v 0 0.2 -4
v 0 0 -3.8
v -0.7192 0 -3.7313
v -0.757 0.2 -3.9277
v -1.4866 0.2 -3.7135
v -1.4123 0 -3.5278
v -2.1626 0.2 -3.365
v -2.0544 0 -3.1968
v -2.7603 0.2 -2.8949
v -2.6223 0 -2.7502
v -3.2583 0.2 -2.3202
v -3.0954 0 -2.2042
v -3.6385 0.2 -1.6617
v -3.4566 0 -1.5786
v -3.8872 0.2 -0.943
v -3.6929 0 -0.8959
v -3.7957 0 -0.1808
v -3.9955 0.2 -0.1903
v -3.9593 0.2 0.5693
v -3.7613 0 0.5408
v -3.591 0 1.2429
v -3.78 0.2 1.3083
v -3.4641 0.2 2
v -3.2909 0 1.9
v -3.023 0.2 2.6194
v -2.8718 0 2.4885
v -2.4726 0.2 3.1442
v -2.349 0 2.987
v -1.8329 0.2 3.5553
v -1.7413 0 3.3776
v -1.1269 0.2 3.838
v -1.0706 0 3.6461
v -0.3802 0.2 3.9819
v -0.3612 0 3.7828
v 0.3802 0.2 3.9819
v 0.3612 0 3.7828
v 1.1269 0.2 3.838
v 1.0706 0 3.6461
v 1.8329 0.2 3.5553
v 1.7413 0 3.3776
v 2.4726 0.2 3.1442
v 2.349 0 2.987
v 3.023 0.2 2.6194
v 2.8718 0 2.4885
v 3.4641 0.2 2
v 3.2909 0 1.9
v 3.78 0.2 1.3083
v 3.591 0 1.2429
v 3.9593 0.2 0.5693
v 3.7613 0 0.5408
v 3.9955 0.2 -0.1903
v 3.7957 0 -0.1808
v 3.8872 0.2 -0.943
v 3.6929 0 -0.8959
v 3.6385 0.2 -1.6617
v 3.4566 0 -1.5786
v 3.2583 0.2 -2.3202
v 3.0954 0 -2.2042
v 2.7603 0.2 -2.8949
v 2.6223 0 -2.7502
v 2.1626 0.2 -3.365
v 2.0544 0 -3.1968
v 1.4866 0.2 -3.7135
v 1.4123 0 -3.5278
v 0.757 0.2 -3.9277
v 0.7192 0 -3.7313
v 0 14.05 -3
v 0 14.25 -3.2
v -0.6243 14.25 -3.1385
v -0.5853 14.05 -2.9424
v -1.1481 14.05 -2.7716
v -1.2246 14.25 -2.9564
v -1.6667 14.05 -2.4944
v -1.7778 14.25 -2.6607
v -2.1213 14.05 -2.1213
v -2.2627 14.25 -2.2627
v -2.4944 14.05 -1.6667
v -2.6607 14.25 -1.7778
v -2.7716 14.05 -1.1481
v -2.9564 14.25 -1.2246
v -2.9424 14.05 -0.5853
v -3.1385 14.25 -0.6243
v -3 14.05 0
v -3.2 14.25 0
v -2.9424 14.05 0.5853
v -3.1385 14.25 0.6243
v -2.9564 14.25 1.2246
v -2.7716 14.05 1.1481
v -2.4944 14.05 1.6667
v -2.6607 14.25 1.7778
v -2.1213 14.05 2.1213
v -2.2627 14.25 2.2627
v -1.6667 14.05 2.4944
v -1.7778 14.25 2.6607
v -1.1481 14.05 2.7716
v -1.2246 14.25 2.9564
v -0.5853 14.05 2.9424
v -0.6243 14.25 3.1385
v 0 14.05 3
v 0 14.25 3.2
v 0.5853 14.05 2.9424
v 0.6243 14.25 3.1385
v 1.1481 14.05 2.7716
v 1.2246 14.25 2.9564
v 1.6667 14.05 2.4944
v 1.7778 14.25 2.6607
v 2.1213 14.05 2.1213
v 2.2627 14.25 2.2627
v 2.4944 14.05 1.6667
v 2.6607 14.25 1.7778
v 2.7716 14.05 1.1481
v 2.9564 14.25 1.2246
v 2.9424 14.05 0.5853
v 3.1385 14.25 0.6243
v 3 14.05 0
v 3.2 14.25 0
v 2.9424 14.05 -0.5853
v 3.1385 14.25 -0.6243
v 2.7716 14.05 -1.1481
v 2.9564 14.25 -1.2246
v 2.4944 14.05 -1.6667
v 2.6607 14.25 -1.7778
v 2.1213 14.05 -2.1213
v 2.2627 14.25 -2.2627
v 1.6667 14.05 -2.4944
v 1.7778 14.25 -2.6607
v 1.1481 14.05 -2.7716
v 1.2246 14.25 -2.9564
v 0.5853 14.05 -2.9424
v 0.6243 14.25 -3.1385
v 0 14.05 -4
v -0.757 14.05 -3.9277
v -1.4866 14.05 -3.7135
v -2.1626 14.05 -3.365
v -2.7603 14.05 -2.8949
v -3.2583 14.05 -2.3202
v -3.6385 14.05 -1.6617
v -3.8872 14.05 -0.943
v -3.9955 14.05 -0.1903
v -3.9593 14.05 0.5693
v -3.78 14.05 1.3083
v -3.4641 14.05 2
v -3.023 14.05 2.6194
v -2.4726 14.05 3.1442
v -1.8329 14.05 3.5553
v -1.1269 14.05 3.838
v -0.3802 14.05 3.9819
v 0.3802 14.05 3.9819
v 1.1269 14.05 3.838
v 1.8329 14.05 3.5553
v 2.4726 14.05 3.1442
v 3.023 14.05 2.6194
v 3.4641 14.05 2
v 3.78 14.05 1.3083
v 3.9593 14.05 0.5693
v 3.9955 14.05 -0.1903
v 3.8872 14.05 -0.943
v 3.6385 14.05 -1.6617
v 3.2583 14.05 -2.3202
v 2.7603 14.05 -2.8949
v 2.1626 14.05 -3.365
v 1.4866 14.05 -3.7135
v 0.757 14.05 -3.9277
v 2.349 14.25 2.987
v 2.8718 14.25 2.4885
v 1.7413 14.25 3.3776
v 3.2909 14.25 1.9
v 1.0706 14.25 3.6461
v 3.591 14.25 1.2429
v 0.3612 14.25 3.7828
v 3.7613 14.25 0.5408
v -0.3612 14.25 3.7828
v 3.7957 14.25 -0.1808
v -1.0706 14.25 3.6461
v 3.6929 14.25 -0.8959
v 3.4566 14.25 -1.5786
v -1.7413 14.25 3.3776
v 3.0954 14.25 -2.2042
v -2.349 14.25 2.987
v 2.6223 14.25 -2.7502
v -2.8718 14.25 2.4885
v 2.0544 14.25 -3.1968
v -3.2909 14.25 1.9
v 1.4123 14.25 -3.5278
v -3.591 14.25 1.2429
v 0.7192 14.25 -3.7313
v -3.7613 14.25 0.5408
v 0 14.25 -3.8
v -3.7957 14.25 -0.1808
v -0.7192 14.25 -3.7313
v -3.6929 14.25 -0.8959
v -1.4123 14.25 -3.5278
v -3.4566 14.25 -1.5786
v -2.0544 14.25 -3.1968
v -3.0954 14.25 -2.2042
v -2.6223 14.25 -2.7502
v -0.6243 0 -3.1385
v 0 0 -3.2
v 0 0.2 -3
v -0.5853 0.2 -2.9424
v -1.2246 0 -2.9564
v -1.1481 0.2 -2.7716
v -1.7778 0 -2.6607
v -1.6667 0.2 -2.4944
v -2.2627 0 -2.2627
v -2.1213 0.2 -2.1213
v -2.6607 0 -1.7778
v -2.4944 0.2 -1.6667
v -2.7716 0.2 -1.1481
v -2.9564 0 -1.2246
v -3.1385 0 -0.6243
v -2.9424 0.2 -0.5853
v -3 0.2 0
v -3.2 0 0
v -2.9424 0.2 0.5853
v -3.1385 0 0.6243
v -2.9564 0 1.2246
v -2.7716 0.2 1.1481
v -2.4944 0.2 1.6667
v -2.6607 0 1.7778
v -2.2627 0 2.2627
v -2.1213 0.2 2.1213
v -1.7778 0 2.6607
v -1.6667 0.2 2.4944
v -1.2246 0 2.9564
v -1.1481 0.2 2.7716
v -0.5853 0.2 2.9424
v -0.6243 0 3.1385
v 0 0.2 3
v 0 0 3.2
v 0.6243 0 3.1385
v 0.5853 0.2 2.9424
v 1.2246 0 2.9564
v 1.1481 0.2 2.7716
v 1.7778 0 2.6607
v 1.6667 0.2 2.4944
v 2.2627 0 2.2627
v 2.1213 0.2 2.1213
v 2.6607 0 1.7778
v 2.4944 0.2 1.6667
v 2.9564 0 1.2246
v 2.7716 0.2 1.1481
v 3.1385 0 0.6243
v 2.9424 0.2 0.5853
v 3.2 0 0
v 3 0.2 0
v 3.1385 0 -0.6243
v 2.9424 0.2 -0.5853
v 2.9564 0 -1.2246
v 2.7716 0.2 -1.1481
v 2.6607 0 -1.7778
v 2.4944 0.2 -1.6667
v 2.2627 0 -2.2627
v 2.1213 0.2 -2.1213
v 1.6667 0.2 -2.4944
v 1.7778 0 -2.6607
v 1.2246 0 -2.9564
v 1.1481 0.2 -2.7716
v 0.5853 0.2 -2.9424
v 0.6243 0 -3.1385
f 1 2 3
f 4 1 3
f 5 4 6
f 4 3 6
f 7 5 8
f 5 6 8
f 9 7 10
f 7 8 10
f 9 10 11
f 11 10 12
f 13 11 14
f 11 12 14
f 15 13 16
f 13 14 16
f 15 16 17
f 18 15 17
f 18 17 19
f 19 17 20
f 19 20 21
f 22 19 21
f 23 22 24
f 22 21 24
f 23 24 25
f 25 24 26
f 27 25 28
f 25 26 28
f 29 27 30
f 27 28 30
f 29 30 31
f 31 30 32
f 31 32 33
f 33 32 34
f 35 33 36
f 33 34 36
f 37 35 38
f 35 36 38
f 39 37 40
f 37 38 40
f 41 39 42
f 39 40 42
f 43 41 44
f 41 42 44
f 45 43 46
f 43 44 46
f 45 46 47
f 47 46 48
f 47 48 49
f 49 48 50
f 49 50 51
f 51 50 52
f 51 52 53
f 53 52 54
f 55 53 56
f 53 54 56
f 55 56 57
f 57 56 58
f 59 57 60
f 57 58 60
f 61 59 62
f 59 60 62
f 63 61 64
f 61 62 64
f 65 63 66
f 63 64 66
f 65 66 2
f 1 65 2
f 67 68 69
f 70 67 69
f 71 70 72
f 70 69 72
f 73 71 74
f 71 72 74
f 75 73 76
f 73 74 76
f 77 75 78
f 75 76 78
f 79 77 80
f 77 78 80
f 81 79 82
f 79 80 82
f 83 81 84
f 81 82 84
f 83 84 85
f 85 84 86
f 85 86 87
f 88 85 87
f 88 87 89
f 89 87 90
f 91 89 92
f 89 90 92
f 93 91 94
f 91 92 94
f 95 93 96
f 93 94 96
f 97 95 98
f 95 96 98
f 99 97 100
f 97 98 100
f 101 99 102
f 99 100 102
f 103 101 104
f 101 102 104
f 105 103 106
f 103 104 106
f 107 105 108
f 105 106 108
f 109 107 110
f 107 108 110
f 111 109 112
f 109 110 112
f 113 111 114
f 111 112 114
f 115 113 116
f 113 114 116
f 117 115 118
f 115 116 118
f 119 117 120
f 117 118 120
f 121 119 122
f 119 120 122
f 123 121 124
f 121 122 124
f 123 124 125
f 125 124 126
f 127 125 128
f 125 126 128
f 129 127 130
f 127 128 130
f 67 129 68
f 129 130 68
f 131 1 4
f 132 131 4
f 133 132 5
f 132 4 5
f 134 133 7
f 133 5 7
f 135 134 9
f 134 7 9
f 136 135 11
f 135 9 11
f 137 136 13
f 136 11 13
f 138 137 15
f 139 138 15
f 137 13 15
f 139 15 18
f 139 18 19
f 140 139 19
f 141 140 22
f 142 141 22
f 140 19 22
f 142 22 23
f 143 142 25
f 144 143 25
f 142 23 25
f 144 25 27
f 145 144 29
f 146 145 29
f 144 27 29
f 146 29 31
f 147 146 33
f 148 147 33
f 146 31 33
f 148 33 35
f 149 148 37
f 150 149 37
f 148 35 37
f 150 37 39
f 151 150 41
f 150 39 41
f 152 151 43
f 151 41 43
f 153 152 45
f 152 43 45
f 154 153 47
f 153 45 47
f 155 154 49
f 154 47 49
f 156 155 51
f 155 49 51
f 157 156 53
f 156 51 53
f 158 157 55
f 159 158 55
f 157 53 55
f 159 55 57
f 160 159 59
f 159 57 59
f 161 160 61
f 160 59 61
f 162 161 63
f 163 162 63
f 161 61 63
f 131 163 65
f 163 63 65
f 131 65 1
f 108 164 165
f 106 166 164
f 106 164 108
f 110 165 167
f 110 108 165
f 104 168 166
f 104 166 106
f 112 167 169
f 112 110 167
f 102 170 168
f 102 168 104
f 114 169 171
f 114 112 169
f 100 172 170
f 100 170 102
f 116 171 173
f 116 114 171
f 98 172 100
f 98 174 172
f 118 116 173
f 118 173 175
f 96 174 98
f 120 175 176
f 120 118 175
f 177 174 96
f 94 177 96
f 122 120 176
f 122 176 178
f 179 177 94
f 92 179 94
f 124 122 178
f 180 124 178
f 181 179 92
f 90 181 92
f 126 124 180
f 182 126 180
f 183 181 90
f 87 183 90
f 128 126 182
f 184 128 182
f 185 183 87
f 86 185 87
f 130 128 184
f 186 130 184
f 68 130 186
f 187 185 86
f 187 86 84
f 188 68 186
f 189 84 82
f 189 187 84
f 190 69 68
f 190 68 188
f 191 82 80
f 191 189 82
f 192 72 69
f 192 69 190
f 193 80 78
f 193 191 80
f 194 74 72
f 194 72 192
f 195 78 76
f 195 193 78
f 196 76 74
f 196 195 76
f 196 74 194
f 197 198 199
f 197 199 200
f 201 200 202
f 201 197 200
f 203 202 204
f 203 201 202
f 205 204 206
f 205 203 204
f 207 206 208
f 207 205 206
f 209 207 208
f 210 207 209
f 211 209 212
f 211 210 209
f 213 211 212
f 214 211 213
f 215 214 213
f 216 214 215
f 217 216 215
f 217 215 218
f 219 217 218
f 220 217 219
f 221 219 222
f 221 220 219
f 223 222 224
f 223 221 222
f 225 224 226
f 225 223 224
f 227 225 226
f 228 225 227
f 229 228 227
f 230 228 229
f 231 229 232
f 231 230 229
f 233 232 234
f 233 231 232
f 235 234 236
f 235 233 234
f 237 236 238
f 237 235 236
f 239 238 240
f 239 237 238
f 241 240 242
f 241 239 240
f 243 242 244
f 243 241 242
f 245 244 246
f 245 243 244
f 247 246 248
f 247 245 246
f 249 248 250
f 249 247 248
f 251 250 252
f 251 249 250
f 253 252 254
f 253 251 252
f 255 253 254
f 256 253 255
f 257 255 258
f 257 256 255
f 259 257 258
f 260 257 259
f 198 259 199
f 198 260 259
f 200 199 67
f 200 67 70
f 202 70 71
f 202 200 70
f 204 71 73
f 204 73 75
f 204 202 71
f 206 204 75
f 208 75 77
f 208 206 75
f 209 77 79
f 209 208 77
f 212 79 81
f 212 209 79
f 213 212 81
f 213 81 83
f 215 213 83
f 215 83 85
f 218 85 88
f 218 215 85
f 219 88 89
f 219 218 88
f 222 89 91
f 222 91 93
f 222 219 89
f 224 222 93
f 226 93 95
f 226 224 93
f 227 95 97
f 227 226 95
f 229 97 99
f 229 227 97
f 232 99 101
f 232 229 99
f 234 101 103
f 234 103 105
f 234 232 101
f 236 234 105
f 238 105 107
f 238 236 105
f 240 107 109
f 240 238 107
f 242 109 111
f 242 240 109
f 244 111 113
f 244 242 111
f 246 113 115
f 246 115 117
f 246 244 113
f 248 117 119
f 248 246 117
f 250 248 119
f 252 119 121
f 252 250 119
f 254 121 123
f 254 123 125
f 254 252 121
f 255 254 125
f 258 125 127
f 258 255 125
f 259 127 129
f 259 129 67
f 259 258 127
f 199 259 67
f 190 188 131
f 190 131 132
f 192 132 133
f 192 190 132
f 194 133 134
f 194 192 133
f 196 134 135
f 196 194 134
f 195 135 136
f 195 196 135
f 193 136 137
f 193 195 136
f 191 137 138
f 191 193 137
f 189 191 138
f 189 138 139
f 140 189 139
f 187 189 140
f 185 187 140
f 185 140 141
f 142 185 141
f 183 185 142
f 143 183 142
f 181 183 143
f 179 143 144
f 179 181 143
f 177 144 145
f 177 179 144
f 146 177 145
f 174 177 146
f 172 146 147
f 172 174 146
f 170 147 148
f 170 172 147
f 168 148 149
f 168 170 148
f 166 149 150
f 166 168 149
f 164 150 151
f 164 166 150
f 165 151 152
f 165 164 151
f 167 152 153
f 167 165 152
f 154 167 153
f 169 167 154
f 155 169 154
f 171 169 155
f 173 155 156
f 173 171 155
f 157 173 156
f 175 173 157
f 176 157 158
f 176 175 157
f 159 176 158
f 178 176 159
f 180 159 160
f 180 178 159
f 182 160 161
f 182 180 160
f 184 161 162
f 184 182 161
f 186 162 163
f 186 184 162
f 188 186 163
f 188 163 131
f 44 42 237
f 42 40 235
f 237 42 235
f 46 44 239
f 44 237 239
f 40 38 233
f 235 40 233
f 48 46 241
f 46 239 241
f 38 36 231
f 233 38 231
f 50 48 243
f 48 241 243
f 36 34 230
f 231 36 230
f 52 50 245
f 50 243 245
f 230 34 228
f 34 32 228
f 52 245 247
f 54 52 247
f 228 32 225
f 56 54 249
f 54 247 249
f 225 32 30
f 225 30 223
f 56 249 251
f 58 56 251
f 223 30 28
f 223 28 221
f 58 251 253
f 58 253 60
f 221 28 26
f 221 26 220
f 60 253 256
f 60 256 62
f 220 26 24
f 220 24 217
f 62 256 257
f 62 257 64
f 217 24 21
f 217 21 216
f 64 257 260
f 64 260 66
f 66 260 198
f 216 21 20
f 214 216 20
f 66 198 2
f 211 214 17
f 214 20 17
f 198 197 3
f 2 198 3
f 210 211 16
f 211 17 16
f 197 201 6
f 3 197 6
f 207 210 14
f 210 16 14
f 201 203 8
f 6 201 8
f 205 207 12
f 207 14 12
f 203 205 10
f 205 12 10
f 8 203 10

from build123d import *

# Parameters (mm, degrees)
SKIZZE1_R                       = 4
SKIZZE1_R_2                     = 3
AUFSATZ_LINEAR_AUSTRAGEN1_DEPTH = 14.25
FASE1_SIZE                      = 0.2


with BuildPart() as part:
    # Skizze1 → Aufsatz-Linear austragen1 (new body)
    with BuildSketch(Plane(origin=(0, 0, 0), x_dir=(1, 0, 0), z_dir=(0, 1, 0))):
        with Locations(Location((0, 0, 0), (0, 0, 90))):
            Circle(SKIZZE1_R)
        with Locations(Location((0, 0, 0), (0, 0, 90))):
            Circle(SKIZZE1_R_2, mode=Mode.SUBTRACT)
    extrude(amount=AUFSATZ_LINEAR_AUSTRAGEN1_DEPTH)

    # Fase1
    fase1_edges = [part.edges().sort_by_distance(p)[0] for p in [
        (0, 0, 4),
        (0, 14.25, 4),
        (0, 0, 3),
        (0, 14.25, 3),
    ]]
    chamfer(fase1_edges, length=FASE1_SIZE)


solid = part.part
